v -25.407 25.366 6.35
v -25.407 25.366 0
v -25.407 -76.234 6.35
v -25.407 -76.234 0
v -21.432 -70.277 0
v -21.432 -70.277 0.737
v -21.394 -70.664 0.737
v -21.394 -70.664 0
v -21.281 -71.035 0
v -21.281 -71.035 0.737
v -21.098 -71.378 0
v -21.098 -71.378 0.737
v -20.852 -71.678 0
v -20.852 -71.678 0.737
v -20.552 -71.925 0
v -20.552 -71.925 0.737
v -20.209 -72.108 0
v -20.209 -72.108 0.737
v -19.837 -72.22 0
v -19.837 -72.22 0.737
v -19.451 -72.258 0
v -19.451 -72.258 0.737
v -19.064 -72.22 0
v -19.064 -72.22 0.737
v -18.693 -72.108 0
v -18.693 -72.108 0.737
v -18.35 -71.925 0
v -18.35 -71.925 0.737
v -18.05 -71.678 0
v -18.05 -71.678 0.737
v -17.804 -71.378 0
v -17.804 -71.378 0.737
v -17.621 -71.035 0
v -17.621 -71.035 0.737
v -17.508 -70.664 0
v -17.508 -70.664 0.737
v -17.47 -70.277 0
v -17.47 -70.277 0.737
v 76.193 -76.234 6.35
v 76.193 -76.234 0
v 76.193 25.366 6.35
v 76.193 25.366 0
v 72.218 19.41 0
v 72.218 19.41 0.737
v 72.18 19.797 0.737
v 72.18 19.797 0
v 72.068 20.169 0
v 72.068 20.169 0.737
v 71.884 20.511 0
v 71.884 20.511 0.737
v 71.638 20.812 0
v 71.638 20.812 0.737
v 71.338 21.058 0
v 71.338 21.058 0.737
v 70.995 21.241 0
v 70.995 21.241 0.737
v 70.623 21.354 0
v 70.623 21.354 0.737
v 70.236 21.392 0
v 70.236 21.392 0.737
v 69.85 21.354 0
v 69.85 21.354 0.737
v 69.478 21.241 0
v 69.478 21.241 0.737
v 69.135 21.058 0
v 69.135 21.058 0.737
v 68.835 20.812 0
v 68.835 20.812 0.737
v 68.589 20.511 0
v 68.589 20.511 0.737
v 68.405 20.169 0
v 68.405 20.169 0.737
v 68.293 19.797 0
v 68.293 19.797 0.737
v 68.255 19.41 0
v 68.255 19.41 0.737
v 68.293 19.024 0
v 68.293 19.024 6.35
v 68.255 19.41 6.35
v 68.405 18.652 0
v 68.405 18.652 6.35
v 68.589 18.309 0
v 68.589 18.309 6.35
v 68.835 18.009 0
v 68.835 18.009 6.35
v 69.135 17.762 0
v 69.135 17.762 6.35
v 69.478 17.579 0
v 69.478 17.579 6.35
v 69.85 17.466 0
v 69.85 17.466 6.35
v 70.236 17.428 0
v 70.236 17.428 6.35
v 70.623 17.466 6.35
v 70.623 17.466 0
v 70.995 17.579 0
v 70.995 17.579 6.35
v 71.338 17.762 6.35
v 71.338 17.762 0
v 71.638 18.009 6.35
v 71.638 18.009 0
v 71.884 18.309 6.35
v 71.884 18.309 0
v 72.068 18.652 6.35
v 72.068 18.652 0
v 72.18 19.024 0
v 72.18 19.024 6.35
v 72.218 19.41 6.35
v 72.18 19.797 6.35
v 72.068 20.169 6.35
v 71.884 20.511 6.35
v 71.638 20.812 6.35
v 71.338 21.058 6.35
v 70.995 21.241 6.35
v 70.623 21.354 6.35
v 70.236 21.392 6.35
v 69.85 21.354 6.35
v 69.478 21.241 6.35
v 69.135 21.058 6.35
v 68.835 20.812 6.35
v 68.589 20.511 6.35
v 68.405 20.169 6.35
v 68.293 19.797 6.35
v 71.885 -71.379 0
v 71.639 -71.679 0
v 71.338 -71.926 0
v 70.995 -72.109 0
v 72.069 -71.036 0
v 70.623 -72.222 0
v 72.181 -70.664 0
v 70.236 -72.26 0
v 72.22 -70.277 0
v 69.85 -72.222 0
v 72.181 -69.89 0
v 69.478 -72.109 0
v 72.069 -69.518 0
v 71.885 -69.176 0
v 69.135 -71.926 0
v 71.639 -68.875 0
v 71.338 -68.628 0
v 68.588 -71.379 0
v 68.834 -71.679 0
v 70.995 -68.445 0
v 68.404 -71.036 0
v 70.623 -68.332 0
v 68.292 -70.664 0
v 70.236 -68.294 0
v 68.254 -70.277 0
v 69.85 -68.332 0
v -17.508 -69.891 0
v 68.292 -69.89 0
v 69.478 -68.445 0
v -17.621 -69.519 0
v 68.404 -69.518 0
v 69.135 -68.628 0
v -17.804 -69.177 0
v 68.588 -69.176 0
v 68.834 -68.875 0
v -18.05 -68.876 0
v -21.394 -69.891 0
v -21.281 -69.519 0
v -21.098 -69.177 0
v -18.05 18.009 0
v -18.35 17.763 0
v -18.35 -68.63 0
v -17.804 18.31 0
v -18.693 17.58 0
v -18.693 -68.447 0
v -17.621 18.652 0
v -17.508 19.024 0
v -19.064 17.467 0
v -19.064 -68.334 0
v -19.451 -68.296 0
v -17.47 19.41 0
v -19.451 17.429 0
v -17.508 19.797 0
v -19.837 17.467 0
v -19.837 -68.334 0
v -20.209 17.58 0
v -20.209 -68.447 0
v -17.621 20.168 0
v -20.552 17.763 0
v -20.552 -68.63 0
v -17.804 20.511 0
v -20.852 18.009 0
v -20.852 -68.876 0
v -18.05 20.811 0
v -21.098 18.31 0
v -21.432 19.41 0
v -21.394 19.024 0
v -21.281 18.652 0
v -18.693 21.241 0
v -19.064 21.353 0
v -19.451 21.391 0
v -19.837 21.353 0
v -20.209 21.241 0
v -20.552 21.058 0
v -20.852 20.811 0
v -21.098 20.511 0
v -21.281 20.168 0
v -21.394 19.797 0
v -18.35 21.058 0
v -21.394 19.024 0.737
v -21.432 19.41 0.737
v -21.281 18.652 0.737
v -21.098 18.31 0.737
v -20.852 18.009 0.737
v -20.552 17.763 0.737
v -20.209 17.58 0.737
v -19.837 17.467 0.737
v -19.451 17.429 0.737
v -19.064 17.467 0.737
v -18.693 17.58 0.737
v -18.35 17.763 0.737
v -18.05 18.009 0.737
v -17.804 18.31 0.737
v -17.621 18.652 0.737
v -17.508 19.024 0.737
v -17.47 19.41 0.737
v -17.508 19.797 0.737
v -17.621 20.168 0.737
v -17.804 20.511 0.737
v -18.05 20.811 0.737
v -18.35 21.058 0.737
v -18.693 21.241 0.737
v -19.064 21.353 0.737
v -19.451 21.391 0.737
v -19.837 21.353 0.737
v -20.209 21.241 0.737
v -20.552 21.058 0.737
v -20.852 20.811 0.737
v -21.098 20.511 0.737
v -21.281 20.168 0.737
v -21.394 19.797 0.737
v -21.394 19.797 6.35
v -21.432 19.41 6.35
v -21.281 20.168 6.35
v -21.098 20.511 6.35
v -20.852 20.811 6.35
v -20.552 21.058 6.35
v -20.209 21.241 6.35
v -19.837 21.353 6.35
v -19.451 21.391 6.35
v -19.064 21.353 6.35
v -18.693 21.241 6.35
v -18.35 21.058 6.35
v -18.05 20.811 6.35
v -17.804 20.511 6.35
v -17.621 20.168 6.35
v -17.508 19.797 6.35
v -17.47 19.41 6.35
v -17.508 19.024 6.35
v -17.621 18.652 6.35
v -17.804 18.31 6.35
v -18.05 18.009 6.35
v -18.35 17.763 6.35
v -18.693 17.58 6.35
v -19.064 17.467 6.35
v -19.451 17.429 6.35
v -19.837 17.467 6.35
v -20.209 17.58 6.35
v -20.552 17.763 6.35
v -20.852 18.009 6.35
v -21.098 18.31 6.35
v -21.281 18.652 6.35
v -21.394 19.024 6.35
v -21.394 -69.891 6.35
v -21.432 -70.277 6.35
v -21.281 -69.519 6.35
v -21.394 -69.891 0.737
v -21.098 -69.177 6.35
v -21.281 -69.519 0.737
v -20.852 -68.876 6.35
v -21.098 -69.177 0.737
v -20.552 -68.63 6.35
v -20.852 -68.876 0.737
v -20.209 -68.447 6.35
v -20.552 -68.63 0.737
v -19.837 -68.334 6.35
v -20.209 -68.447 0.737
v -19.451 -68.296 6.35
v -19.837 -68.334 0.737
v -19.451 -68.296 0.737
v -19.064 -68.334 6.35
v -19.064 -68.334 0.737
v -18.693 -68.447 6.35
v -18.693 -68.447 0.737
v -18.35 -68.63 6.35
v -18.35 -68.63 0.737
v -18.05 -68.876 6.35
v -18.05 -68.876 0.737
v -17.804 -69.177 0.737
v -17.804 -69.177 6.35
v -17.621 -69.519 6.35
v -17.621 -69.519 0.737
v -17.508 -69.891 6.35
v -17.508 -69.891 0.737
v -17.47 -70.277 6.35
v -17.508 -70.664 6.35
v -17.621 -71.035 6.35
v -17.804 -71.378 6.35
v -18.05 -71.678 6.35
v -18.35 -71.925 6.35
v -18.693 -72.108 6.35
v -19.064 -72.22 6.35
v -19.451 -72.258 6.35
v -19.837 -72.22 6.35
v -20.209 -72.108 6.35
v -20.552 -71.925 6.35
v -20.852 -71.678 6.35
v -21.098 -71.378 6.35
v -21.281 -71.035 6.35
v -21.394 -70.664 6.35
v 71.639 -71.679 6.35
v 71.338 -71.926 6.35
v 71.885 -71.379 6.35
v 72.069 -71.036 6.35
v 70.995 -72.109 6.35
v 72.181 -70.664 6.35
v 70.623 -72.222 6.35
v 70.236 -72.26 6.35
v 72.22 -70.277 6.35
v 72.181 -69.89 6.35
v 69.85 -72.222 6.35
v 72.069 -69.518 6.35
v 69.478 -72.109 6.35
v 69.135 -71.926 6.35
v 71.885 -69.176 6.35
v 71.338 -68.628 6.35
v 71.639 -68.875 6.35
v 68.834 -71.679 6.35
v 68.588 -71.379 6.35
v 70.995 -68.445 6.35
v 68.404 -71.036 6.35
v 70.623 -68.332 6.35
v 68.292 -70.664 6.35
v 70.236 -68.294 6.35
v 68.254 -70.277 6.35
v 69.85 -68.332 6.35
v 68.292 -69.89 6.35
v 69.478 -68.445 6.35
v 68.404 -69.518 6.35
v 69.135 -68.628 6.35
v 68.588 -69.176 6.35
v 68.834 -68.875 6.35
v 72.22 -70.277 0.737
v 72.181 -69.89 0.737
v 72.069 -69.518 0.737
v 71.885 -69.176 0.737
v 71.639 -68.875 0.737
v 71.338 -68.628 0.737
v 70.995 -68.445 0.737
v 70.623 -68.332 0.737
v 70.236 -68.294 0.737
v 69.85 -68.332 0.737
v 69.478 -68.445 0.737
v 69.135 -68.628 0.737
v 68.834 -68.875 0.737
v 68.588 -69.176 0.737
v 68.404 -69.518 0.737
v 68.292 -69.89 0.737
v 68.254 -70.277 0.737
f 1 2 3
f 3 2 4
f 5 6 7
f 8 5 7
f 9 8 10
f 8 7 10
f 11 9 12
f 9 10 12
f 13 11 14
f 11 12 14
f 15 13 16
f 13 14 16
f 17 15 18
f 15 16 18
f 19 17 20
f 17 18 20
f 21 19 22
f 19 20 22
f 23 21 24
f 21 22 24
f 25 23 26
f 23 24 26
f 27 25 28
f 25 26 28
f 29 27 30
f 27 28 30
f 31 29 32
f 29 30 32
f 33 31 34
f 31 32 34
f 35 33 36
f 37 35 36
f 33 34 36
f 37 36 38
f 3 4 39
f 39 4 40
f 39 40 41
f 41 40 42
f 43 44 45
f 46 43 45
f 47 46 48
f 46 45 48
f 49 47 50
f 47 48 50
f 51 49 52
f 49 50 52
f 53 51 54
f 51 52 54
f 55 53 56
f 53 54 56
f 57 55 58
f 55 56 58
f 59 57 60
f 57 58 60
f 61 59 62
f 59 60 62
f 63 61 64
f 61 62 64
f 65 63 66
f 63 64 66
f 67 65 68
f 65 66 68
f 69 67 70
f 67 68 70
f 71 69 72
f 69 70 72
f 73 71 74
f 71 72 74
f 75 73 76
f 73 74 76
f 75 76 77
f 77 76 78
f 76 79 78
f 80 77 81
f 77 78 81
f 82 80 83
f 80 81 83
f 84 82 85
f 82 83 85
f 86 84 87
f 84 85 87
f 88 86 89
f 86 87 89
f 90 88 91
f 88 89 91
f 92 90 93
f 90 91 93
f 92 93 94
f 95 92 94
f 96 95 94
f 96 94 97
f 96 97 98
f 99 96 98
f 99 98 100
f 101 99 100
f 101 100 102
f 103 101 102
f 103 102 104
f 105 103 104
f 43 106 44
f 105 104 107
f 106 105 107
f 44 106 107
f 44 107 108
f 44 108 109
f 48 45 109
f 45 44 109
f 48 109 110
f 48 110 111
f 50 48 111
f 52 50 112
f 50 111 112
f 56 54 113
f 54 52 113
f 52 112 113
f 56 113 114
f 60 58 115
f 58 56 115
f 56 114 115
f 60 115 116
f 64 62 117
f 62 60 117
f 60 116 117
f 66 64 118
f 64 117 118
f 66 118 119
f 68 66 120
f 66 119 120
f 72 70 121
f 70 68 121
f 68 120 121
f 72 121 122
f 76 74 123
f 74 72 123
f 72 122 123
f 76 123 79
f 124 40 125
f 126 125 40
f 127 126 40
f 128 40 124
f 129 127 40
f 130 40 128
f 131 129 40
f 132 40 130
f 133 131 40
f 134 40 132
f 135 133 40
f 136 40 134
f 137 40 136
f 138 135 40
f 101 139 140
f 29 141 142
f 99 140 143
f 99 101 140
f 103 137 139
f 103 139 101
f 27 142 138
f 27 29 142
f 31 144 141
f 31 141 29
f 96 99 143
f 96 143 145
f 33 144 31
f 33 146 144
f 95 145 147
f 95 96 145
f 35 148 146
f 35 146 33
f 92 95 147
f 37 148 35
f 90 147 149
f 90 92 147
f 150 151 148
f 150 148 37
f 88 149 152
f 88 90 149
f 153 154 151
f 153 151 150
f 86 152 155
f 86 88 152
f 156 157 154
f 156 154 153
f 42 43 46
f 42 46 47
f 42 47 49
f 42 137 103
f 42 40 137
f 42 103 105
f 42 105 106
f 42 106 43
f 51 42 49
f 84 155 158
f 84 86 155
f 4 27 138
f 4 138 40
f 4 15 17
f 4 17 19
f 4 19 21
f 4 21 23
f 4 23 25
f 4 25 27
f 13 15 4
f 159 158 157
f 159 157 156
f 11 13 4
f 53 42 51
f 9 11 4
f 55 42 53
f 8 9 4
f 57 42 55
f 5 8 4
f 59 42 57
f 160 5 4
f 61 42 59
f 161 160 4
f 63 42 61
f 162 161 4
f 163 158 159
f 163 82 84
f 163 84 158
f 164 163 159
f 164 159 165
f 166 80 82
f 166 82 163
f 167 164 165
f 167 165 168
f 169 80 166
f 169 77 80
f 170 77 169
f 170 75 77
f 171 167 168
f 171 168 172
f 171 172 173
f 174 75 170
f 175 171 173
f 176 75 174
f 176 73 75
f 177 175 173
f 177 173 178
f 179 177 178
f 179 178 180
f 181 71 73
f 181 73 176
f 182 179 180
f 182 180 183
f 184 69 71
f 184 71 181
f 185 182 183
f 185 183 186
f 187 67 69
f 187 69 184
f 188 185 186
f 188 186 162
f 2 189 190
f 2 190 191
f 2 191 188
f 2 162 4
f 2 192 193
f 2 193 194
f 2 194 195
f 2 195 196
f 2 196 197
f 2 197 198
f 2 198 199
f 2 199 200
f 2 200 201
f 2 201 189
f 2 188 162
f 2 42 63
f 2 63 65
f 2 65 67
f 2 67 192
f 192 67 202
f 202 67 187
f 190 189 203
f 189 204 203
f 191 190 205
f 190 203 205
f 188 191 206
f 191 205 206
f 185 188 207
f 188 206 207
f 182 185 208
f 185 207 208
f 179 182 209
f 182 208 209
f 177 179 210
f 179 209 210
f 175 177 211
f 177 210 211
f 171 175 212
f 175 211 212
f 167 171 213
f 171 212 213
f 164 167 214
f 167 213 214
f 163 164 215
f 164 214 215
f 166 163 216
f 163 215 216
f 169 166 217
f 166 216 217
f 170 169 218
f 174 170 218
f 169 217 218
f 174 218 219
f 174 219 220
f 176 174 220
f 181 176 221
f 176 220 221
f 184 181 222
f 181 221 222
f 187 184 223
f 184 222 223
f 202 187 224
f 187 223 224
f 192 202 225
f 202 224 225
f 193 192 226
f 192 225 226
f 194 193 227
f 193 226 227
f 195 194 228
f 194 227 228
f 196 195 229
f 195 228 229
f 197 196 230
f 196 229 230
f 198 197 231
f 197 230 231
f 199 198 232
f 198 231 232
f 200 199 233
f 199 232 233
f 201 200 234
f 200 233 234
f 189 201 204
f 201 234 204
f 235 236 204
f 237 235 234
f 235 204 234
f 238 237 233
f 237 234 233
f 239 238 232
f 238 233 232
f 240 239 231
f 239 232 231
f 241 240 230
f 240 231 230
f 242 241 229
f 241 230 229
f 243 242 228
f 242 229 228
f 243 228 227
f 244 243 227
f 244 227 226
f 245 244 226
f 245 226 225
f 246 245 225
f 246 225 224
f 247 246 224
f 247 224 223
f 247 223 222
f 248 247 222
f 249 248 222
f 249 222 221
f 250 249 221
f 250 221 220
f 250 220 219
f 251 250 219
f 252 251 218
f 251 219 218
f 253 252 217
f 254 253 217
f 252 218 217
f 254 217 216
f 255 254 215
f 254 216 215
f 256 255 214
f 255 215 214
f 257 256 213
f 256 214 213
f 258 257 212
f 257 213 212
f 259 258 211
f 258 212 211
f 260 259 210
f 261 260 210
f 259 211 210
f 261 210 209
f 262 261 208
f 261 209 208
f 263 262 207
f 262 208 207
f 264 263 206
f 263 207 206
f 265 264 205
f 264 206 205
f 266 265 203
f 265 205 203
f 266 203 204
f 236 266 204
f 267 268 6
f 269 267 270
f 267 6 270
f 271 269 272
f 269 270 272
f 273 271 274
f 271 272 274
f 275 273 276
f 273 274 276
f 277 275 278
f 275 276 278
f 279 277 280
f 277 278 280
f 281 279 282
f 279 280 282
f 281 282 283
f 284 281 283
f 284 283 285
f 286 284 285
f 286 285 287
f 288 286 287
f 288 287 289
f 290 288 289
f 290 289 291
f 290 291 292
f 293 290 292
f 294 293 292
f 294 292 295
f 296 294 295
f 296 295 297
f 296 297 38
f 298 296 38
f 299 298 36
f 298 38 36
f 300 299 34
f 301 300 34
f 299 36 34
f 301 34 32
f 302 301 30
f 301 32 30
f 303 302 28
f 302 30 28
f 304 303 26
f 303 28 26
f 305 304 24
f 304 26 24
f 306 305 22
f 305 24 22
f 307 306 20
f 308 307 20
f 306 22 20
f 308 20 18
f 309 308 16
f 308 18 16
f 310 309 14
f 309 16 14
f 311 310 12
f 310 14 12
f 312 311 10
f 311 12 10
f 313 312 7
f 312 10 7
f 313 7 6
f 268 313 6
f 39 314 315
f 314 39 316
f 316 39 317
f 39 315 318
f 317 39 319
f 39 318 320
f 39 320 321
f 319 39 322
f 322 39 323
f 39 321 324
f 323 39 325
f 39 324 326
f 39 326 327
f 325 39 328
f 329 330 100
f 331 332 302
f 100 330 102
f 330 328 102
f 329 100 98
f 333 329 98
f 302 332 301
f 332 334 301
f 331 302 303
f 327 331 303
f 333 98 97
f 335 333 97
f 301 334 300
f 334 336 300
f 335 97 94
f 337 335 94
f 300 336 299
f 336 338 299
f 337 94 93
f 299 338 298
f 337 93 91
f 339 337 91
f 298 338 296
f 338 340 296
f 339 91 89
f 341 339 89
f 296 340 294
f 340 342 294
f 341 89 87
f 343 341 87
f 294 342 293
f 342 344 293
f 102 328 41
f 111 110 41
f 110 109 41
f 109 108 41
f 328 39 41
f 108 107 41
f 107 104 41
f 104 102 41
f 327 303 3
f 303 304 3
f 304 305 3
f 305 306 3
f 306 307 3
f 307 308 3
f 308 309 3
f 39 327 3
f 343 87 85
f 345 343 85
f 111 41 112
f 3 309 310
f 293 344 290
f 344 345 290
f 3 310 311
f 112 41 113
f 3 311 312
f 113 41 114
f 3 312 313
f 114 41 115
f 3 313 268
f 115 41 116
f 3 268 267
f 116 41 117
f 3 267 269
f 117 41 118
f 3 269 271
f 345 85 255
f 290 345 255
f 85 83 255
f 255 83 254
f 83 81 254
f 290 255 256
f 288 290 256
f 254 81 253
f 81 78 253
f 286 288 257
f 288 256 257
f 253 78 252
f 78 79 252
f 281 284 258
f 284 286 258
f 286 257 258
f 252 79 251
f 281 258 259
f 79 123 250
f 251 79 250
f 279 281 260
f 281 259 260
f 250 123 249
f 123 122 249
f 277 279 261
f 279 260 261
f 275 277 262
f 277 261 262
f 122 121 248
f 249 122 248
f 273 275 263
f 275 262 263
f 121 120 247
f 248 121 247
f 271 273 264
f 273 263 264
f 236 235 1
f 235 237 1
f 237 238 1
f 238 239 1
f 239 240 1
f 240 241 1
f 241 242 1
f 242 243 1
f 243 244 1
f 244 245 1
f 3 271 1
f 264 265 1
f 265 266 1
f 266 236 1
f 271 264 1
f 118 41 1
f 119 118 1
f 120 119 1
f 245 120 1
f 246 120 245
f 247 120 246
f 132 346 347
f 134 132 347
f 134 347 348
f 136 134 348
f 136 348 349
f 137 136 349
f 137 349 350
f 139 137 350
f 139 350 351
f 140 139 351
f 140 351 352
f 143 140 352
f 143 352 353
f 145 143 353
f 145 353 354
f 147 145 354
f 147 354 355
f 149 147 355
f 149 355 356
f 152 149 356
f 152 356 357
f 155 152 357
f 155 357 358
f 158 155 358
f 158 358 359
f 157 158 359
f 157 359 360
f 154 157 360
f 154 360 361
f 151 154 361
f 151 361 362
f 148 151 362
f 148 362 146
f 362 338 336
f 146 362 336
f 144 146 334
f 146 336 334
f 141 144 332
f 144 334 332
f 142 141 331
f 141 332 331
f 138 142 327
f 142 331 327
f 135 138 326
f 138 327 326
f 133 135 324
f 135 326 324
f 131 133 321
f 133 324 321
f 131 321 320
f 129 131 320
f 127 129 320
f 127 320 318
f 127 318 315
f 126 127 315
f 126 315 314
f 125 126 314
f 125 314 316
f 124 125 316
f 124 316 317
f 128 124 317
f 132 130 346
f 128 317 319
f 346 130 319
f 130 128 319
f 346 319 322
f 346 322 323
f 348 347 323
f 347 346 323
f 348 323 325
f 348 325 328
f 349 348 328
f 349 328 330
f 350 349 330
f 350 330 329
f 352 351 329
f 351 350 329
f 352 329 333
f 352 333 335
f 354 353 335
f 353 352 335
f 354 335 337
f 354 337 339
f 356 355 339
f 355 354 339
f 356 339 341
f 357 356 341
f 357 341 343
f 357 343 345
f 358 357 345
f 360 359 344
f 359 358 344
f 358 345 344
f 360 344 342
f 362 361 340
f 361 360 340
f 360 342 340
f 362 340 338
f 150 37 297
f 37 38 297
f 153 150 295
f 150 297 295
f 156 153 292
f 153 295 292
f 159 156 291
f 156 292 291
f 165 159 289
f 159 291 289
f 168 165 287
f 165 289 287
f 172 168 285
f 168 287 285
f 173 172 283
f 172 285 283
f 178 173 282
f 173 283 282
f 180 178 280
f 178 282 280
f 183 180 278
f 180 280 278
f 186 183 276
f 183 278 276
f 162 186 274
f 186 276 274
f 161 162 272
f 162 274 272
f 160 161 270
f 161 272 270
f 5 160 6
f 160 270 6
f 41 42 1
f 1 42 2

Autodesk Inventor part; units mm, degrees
ref_plane "YZ Plane" through (0, 0, 0) normal (1, 0, 0) x (0, 1, 0)
ref_plane "XZ Plane" through (0, 0, 0) normal (0, 1, 0) x (-1, 0, 0)
ref_plane "XY Plane" through (0, 0, 0) normal (0, 0, 1) x (1, 0, 0)
sketch "Sketch1" plane through (0, 0, 0) normal (0, 0, 1) x (1, 0, 0)
  line L0 (-25.4072, 25.3665) -> (76.1928, 25.3665)
  line L1 (76.1928, 25.3665) -> (76.1928, -76.2335)
  line L2 (76.1928, -76.2335) -> (-25.4072, -76.2335)
  line L3 (-25.4072, -76.2335) -> (-25.4072, 25.3665)
  point P0 (0, 0)
  dimension "d0" = 101.6
  dimension "d1" = 101.6
extrude "Extrusion1" add sketch "Sketch1" along normal blind 0.7366
sketch "Sketch2" plane through (0, 0, 0.7366) normal (0, 0, 1) x (1, 0, 0)
  line L0 (-25.4072, 25.3665) -> (76.1928, -76.2335)
  line L1 (76.1928, 25.3665) -> (-25.4072, -76.2335)
  circle A0 centre (25.3928, -25.4335) radius 27.432
  point P0 (0, 0)
  dimension "d4" = 54.864
extrude "Extrusion2" cut sketch "Sketch2" against normal blind 0.7366
sketch "Sketch3" plane through (0, 0, 0.7366) normal (0, 0, 1) x (1, 0, 0)
  line L0 (-25.4072, -76.2335) -> (-25.4072, 25.3665) projected
  line L1 (-25.4072, 25.3665) -> (-25.4072, -25.4335)
  line L2 (-25.4072, -25.4335) -> (-25.4072, 19.4102)
  line L3 (-25.4072, 25.3665) -> (76.1928, -76.2335)
  line L4 (76.1928, 25.3665) -> (-25.4072, -76.2335)
  circle A0 centre (-19.4509, 19.4102) radius 1.9812
  point P0 (0, 0)
  dimension "d7" = 44.8437
  dimension "d8" = 3.9624
extrude "Extrusion3" cut sketch "Sketch3" against normal blind 0.7366 contours A0 L3 | L3 A0
sketch "Sketch4" plane through (0, 0, 0.7366) normal (0, 0, 1) x (1, 0, 0)
  line L0 (-25.4072, -76.2335) -> (76.1928, 25.3665)
  line L1 (-25.4072, 25.3665) -> (76.1928, -76.2335)
  circle A0 centre (70.2365, 19.4102) radius 1.9819
  circle A1 centre (70.2365, -70.2772) radius 1.983
  circle A2 centre (-19.4509, -70.2772) radius 1.9812
  point P0 (0, 0)
extrude "Extrusion4" cut sketch "Sketch4" against normal blind 0.7366
sketch "Sketch5" plane through (0, 0, 0.7366) normal (0, 0, 1) x (1, 0, 0)
  circle A0 centre (25.3928, -25.4335) radius 27.432 projected
  circle A1 centre (25.3928, -25.4335) radius 29.972
  circle A2 centre (25.3928, -25.4335) radius 32.512
  point P0 (0, 0)
  dimension "d13" = 59.944
  dimension "d14" = 65.024
extrude "Extrusion5" add sketch "Sketch5" along normal blind 6.6548 contours A2
fillet "Fillet1" radius 3.175 4 edges at (-25.4072, 25.3665, 0.3683) (76.1928, 25.3665, 0.3683) (76.1928, -76.2335, 0.3683) (-25.4072, -76.2335, 0.3683)
sketch "Sketch6" plane through (0, 0, 0) normal (0, 0, -1) x (-1, 0, 0)
  circle A0 centre (-70.2365, 19.4102) radius 1.9819 projected
  circle A1 centre (19.4509, -70.2772) radius 1.9812 projected
  circle A2 centre (-70.2365, -70.2772) radius 1.983 projected
  circle A3 centre (19.4509, 19.4102) radius 1.9812 projected
  line L0 (-76.1928, 25.3665) -> (25.4072, 25.3665)
  line L1 (25.4072, 25.3665) -> (25.4072, -76.2335)
  line L2 (25.4072, -76.2335) -> (-76.1928, -76.2335)
  line L3 (-76.1928, -76.2335) -> (-76.1928, 25.3665)
  point P0 (0, 0)
extrude "Extrusion6" add sketch "Sketch6" against normal blind 6.35
sketch "Sketch7" plane through (0, 0, 6.35) normal (0, 0, 1) x (1, 0, 0)
  line L0 (-14.3145, 13.5707) -> (65.0173, 13.5707)
  line L1 (65.0173, 13.5707) -> (65.0173, -65.16)
  line L2 (65.0173, -65.16) -> (-14.3145, -65.16)
  line L3 (-14.3145, -65.16) -> (-14.3145, 13.5707)
  point P0 (0, 0)
extrude "Extrusion7" cut sketch "Sketch7" along normal blind 6.35
sketch "Sketch8" plane through (0, 0, 6.35) normal (0, 0, 1) x (1, 0, 0)
  circle A0 centre (70.2365, -70.2772) radius 1.983 projected
  circle A1 centre (-19.4509, 19.4102) radius 1.9812 projected
  line L0 (-19.4509, 19.4102) -> (70.2365, 19.4102)
  line L1 (70.2365, 19.4102) -> (70.2365, -70.2772)
  line L2 (70.2365, -70.2772) -> (-19.4509, -70.2772)
  line L3 (-19.4509, -70.2772) -> (-19.4509, 19.4102)
  line L4 (63.8865, 13.0602) -> (-13.1009, 13.0602)
  line L5 (-13.1009, 13.0602) -> (-13.1009, -63.9272)
  line L6 (-13.1009, -63.9272) -> (63.8865, -63.9272)
  line L7 (63.8865, -63.9272) -> (63.8865, 13.0602)
  line L8 (-13.1009, -25.4335) -> (-13.1009, -19.0835)
  line L9 (-13.1009, -19.0835) -> (63.8865, -19.0835)
  line L10 (63.8865, -19.0835) -> (63.8865, -31.7835)
  line L11 (63.8865, -31.7835) -> (-13.1009, -31.7835)
  point P0 (0, 0)
  dimension "d22" = 6.35
  dimension "d23" = 6.35
  dimension "d24" = 12.7
extrude "Extrusion8" cut sketch "Sketch8" against normal blind 25.4 contours L7 L9 L5 L4 | L7 L6 L5 L11
sketch "Sketch9" plane through (0, 0, 6.35) normal (0, 0, 1) x (1, 0, 0)
  line L0 (63.8865, -63.9272) -> (-13.1009, -63.9272) projected
  line L1 (-13.1009, 13.0602) -> (63.8865, 13.0602) projected
  line L2 (-25.4072, 25.3665) -> (76.1928, 25.3665) projected
  line L3 (76.1928, -76.2335) -> (-25.4072, -76.2335) projected
  line L4 (-13.1009, 13.0602) -> (-13.1009, 25.3665)
  line L5 (63.8865, 13.0602) -> (63.8865, 25.3665)
  line L6 (63.8865, -63.9272) -> (63.8865, -76.2335)
  line L7 (-13.1009, -63.9272) -> (-13.1009, -76.2335)
  point P0 (0, 0)
extrude "Extrusion9" cut sketch "Sketch9" against normal blind 25.4
sketch "Sketch10" plane through (0, 0, 6.35) normal (0, 0, 1) x (1, 0, 0)
  line L0 (63.8865, 25.3665) -> (63.8865, -19.0835) projected
  line L1 (63.8865, -19.0835) -> (-13.1009, -19.0835) projected
  line L2 (-13.1009, -19.0835) -> (-13.1009, 25.3665) projected
  line L3 (-13.1009, -76.2335) -> (-13.1009, -31.7835) projected
  line L4 (-13.1009, -31.7835) -> (63.8865, -31.7835) projected
  line L5 (63.8865, -31.7835) -> (63.8865, -76.2335) projected
  line L6 (63.8865, 25.3665) -> (76.1928, 25.3665) projected
  line L7 (-13.1009, 25.3665) -> (63.8865, 25.3665)
  line L8 (-13.1009, -76.2335) -> (63.8865, -76.2335)
  point P0 (0, 0)
extrude "Extrusion10" add sketch "Sketch10" against normal blind 6.35
properties part number "tb"
